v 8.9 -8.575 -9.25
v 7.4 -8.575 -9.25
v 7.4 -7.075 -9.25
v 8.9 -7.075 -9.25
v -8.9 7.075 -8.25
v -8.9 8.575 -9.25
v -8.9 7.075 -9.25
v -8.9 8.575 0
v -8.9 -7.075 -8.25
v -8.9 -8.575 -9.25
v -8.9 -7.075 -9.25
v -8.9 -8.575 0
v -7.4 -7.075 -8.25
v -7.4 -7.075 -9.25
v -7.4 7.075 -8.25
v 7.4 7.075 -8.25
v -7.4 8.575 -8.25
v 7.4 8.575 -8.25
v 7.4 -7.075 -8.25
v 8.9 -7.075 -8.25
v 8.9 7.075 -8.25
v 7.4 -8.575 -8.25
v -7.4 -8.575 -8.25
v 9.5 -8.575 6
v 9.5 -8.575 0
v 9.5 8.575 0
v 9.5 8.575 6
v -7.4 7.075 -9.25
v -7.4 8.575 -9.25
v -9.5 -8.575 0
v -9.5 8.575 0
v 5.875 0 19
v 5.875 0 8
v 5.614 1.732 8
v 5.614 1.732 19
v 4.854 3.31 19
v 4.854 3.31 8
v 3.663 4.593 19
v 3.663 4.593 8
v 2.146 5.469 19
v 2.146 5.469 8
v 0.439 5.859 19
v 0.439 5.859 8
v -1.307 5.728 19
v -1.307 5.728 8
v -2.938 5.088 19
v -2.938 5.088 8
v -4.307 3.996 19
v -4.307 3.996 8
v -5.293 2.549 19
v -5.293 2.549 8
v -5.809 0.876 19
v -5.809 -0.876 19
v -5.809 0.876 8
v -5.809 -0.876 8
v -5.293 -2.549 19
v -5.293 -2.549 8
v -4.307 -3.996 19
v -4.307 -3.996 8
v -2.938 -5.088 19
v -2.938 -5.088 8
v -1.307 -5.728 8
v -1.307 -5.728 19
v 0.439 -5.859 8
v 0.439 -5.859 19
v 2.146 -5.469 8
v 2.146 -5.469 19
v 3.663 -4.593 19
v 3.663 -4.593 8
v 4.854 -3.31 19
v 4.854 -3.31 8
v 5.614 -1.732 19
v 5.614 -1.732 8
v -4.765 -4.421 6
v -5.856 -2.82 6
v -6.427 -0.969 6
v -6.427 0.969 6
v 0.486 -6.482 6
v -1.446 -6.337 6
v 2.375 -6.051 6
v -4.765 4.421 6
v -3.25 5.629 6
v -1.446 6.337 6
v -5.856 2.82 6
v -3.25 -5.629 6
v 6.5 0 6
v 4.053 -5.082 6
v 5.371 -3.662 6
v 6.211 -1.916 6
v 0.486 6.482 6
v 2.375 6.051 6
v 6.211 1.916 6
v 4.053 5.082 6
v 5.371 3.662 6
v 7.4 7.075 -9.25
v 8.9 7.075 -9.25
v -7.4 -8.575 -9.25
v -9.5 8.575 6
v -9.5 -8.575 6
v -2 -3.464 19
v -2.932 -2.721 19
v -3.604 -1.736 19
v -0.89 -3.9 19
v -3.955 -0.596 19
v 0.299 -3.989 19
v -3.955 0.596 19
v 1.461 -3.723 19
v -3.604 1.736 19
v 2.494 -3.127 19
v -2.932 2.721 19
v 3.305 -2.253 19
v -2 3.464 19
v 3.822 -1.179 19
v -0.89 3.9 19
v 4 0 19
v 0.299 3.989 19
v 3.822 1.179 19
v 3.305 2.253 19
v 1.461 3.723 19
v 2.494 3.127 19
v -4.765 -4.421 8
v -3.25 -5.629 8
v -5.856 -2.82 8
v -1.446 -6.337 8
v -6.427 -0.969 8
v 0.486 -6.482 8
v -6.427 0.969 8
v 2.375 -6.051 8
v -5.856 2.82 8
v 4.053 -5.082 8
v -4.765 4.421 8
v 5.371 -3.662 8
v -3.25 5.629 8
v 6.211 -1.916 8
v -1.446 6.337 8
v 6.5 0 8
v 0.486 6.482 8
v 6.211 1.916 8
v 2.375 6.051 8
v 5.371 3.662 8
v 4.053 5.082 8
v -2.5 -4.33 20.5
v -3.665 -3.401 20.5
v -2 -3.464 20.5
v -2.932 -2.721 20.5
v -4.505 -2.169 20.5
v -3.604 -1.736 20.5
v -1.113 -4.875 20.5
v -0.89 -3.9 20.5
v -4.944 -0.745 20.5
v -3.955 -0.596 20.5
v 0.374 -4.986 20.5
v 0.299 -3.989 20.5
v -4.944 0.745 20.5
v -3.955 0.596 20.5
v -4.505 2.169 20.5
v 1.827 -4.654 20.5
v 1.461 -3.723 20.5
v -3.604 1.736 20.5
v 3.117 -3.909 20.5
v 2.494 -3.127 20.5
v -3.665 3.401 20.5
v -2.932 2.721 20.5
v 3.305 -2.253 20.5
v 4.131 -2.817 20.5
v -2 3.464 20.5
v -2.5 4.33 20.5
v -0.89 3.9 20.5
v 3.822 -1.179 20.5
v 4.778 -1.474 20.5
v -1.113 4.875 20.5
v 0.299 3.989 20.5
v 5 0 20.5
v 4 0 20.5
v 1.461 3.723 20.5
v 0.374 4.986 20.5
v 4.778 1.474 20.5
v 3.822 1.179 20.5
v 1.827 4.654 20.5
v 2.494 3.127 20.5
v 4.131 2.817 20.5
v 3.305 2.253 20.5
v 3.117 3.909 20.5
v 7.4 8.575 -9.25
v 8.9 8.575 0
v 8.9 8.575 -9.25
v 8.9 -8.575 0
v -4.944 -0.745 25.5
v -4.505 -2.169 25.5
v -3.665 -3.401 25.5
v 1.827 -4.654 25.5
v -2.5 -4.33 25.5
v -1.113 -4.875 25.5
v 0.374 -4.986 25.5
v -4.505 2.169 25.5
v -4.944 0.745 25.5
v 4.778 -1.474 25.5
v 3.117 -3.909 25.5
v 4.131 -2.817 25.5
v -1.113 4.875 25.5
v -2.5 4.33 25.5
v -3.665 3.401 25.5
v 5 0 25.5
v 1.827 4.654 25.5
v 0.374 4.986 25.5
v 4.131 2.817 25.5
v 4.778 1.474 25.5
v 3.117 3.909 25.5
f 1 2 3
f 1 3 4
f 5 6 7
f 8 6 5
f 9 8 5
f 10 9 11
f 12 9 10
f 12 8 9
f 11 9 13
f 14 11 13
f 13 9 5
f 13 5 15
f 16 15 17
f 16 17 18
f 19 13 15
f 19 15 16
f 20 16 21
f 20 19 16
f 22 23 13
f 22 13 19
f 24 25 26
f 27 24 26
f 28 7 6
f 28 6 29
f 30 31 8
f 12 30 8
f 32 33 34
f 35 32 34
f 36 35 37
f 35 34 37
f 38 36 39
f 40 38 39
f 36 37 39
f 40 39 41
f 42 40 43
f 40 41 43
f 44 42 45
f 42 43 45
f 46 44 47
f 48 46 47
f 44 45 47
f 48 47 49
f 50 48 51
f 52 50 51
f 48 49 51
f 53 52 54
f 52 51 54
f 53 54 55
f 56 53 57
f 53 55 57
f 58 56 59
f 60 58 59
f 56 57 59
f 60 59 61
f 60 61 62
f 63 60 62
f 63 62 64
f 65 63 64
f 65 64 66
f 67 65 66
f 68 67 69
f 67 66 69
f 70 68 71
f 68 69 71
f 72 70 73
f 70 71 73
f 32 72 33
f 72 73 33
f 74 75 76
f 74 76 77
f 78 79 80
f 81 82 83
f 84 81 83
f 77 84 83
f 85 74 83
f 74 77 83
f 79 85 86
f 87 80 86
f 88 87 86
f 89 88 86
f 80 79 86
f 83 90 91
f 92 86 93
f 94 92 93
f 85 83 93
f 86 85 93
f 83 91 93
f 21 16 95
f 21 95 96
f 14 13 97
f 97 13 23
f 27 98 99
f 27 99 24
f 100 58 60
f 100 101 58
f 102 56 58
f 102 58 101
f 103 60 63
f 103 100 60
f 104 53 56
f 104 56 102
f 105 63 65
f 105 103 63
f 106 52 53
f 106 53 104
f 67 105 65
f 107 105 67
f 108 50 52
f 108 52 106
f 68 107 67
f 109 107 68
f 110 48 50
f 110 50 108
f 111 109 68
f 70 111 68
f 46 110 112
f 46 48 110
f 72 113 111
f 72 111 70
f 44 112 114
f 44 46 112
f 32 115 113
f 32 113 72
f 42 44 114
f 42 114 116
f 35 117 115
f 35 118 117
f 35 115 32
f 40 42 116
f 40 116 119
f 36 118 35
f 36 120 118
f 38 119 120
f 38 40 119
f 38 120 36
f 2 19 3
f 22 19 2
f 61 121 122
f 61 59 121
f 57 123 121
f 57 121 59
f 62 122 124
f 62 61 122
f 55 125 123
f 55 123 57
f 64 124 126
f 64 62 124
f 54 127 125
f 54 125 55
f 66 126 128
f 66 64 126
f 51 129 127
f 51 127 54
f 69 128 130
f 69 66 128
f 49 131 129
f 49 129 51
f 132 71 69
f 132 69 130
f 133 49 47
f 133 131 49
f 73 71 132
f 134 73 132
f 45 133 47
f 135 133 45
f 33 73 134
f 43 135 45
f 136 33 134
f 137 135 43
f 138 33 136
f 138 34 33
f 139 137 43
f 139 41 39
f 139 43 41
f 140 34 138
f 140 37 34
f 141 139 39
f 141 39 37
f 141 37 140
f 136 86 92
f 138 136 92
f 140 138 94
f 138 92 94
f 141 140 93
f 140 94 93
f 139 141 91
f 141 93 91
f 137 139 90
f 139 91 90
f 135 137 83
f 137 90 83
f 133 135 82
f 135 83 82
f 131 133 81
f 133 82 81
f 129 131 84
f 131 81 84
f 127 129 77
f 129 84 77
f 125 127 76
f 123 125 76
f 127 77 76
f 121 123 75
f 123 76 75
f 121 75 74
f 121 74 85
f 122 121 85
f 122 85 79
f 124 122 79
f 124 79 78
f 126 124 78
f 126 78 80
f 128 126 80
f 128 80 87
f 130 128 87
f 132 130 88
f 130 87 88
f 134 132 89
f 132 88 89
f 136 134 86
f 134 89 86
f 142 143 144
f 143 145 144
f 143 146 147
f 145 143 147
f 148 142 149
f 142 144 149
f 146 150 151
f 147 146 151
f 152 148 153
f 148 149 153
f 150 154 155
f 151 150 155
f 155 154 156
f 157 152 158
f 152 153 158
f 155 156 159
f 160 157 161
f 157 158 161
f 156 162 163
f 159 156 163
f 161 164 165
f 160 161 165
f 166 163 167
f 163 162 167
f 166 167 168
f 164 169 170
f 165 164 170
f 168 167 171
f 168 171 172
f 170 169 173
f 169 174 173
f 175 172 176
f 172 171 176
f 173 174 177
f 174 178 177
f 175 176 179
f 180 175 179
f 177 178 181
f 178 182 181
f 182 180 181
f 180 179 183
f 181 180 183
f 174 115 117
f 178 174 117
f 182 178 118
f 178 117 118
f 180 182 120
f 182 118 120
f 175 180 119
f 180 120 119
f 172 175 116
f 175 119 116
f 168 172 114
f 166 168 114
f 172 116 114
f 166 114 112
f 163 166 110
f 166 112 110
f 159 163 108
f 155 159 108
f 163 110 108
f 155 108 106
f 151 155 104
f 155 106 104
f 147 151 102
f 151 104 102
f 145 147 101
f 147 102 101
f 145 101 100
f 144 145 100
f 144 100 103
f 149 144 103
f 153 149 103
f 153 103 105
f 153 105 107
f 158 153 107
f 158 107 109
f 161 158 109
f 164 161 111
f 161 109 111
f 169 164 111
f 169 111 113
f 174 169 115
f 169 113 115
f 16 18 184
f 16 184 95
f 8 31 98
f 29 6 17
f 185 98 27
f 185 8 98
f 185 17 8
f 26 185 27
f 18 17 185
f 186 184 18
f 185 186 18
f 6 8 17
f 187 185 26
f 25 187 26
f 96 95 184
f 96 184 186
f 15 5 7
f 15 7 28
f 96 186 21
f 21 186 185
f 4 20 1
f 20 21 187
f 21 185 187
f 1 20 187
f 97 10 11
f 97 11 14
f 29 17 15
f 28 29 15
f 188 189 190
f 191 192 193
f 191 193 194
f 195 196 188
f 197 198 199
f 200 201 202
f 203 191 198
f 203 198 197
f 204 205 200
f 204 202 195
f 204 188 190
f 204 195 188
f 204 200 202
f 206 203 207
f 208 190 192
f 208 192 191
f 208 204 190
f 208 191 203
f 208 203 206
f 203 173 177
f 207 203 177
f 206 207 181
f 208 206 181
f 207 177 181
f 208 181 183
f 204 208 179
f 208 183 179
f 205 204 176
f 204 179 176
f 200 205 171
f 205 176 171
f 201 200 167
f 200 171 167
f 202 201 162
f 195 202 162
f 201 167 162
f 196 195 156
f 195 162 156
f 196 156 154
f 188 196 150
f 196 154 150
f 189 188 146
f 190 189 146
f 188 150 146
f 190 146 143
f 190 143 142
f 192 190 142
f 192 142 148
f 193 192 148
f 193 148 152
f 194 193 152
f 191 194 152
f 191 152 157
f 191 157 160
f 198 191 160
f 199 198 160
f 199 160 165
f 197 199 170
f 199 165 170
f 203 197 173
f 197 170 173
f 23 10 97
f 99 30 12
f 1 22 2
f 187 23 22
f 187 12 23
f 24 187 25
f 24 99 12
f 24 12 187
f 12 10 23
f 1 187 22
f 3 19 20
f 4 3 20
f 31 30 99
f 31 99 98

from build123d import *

# Parameters (mm, degrees)
F0_W      = 19
F0_H      = 17.15
F1_DEPTH  = 6
F2_W      = 17.8
F2_H      = 17.15
F3_DEPTH  = 8.25
F4_W      = 1.5
F4_H      = 1.5
F5_DEPTH  = 1
F6_R      = 6.5
F7_DEPTH  = 2
F8_R      = 5.875
F9_DEPTH  = 11
F10_R     = 4
F11_DEPTH = 1.5
F12_R     = 5
F13_DEPTH = 5


with BuildPart() as f1:
    # F0 (on Top) → F1 (new body)
    with BuildSketch(Plane.XY):
        Rectangle(F0_W, F0_H)
    extrude(amount=F1_DEPTH)

    # F2 (on face) → F3 (join)
    with BuildSketch(Plane(origin=(0, 0, 0), x_dir=(1, 0, 0), z_dir=(0, 0, -1))):
        Rectangle(F2_W, F2_H)
    extrude(amount=F3_DEPTH)

    # F4 (on face) → F5 (join)
    with BuildSketch(Plane(origin=(0, 0, -8.25), x_dir=(1, 0, 0), z_dir=(0, 0, -1))):
        with Locations((-8.15, 7.825)):
            Rectangle(F4_W, F4_H)
        with Locations((8.15, 7.825)):
            Rectangle(F4_W, F4_H)
        with Locations((-8.15, -7.825)):
            Rectangle(F4_W, F4_H)
        with Locations((8.15, -7.825)):
            Rectangle(F4_W, F4_H)
    extrude(amount=F5_DEPTH)


with BuildPart() as f7:
    # F6 (on face) → F7 (new body)
    with BuildSketch(Plane.XY.offset(6)):
        Circle(F6_R)
    extrude(amount=F7_DEPTH)

    # F8 (on face) → F9 (join)
    with BuildSketch(Plane.XY.offset(8)):
        Circle(F8_R)
    extrude(amount=F9_DEPTH)

    # F10 (on face) → F11 (join)
    with BuildSketch(Plane.XY.offset(19)):
        Circle(F10_R)
    extrude(amount=F11_DEPTH)

    # F12 (on face) → F13 (join)
    with BuildSketch(Plane.XY.offset(20.5)):
        Circle(F12_R)
    extrude(amount=F13_DEPTH)


solid = Compound([f1.part, f7.part])
